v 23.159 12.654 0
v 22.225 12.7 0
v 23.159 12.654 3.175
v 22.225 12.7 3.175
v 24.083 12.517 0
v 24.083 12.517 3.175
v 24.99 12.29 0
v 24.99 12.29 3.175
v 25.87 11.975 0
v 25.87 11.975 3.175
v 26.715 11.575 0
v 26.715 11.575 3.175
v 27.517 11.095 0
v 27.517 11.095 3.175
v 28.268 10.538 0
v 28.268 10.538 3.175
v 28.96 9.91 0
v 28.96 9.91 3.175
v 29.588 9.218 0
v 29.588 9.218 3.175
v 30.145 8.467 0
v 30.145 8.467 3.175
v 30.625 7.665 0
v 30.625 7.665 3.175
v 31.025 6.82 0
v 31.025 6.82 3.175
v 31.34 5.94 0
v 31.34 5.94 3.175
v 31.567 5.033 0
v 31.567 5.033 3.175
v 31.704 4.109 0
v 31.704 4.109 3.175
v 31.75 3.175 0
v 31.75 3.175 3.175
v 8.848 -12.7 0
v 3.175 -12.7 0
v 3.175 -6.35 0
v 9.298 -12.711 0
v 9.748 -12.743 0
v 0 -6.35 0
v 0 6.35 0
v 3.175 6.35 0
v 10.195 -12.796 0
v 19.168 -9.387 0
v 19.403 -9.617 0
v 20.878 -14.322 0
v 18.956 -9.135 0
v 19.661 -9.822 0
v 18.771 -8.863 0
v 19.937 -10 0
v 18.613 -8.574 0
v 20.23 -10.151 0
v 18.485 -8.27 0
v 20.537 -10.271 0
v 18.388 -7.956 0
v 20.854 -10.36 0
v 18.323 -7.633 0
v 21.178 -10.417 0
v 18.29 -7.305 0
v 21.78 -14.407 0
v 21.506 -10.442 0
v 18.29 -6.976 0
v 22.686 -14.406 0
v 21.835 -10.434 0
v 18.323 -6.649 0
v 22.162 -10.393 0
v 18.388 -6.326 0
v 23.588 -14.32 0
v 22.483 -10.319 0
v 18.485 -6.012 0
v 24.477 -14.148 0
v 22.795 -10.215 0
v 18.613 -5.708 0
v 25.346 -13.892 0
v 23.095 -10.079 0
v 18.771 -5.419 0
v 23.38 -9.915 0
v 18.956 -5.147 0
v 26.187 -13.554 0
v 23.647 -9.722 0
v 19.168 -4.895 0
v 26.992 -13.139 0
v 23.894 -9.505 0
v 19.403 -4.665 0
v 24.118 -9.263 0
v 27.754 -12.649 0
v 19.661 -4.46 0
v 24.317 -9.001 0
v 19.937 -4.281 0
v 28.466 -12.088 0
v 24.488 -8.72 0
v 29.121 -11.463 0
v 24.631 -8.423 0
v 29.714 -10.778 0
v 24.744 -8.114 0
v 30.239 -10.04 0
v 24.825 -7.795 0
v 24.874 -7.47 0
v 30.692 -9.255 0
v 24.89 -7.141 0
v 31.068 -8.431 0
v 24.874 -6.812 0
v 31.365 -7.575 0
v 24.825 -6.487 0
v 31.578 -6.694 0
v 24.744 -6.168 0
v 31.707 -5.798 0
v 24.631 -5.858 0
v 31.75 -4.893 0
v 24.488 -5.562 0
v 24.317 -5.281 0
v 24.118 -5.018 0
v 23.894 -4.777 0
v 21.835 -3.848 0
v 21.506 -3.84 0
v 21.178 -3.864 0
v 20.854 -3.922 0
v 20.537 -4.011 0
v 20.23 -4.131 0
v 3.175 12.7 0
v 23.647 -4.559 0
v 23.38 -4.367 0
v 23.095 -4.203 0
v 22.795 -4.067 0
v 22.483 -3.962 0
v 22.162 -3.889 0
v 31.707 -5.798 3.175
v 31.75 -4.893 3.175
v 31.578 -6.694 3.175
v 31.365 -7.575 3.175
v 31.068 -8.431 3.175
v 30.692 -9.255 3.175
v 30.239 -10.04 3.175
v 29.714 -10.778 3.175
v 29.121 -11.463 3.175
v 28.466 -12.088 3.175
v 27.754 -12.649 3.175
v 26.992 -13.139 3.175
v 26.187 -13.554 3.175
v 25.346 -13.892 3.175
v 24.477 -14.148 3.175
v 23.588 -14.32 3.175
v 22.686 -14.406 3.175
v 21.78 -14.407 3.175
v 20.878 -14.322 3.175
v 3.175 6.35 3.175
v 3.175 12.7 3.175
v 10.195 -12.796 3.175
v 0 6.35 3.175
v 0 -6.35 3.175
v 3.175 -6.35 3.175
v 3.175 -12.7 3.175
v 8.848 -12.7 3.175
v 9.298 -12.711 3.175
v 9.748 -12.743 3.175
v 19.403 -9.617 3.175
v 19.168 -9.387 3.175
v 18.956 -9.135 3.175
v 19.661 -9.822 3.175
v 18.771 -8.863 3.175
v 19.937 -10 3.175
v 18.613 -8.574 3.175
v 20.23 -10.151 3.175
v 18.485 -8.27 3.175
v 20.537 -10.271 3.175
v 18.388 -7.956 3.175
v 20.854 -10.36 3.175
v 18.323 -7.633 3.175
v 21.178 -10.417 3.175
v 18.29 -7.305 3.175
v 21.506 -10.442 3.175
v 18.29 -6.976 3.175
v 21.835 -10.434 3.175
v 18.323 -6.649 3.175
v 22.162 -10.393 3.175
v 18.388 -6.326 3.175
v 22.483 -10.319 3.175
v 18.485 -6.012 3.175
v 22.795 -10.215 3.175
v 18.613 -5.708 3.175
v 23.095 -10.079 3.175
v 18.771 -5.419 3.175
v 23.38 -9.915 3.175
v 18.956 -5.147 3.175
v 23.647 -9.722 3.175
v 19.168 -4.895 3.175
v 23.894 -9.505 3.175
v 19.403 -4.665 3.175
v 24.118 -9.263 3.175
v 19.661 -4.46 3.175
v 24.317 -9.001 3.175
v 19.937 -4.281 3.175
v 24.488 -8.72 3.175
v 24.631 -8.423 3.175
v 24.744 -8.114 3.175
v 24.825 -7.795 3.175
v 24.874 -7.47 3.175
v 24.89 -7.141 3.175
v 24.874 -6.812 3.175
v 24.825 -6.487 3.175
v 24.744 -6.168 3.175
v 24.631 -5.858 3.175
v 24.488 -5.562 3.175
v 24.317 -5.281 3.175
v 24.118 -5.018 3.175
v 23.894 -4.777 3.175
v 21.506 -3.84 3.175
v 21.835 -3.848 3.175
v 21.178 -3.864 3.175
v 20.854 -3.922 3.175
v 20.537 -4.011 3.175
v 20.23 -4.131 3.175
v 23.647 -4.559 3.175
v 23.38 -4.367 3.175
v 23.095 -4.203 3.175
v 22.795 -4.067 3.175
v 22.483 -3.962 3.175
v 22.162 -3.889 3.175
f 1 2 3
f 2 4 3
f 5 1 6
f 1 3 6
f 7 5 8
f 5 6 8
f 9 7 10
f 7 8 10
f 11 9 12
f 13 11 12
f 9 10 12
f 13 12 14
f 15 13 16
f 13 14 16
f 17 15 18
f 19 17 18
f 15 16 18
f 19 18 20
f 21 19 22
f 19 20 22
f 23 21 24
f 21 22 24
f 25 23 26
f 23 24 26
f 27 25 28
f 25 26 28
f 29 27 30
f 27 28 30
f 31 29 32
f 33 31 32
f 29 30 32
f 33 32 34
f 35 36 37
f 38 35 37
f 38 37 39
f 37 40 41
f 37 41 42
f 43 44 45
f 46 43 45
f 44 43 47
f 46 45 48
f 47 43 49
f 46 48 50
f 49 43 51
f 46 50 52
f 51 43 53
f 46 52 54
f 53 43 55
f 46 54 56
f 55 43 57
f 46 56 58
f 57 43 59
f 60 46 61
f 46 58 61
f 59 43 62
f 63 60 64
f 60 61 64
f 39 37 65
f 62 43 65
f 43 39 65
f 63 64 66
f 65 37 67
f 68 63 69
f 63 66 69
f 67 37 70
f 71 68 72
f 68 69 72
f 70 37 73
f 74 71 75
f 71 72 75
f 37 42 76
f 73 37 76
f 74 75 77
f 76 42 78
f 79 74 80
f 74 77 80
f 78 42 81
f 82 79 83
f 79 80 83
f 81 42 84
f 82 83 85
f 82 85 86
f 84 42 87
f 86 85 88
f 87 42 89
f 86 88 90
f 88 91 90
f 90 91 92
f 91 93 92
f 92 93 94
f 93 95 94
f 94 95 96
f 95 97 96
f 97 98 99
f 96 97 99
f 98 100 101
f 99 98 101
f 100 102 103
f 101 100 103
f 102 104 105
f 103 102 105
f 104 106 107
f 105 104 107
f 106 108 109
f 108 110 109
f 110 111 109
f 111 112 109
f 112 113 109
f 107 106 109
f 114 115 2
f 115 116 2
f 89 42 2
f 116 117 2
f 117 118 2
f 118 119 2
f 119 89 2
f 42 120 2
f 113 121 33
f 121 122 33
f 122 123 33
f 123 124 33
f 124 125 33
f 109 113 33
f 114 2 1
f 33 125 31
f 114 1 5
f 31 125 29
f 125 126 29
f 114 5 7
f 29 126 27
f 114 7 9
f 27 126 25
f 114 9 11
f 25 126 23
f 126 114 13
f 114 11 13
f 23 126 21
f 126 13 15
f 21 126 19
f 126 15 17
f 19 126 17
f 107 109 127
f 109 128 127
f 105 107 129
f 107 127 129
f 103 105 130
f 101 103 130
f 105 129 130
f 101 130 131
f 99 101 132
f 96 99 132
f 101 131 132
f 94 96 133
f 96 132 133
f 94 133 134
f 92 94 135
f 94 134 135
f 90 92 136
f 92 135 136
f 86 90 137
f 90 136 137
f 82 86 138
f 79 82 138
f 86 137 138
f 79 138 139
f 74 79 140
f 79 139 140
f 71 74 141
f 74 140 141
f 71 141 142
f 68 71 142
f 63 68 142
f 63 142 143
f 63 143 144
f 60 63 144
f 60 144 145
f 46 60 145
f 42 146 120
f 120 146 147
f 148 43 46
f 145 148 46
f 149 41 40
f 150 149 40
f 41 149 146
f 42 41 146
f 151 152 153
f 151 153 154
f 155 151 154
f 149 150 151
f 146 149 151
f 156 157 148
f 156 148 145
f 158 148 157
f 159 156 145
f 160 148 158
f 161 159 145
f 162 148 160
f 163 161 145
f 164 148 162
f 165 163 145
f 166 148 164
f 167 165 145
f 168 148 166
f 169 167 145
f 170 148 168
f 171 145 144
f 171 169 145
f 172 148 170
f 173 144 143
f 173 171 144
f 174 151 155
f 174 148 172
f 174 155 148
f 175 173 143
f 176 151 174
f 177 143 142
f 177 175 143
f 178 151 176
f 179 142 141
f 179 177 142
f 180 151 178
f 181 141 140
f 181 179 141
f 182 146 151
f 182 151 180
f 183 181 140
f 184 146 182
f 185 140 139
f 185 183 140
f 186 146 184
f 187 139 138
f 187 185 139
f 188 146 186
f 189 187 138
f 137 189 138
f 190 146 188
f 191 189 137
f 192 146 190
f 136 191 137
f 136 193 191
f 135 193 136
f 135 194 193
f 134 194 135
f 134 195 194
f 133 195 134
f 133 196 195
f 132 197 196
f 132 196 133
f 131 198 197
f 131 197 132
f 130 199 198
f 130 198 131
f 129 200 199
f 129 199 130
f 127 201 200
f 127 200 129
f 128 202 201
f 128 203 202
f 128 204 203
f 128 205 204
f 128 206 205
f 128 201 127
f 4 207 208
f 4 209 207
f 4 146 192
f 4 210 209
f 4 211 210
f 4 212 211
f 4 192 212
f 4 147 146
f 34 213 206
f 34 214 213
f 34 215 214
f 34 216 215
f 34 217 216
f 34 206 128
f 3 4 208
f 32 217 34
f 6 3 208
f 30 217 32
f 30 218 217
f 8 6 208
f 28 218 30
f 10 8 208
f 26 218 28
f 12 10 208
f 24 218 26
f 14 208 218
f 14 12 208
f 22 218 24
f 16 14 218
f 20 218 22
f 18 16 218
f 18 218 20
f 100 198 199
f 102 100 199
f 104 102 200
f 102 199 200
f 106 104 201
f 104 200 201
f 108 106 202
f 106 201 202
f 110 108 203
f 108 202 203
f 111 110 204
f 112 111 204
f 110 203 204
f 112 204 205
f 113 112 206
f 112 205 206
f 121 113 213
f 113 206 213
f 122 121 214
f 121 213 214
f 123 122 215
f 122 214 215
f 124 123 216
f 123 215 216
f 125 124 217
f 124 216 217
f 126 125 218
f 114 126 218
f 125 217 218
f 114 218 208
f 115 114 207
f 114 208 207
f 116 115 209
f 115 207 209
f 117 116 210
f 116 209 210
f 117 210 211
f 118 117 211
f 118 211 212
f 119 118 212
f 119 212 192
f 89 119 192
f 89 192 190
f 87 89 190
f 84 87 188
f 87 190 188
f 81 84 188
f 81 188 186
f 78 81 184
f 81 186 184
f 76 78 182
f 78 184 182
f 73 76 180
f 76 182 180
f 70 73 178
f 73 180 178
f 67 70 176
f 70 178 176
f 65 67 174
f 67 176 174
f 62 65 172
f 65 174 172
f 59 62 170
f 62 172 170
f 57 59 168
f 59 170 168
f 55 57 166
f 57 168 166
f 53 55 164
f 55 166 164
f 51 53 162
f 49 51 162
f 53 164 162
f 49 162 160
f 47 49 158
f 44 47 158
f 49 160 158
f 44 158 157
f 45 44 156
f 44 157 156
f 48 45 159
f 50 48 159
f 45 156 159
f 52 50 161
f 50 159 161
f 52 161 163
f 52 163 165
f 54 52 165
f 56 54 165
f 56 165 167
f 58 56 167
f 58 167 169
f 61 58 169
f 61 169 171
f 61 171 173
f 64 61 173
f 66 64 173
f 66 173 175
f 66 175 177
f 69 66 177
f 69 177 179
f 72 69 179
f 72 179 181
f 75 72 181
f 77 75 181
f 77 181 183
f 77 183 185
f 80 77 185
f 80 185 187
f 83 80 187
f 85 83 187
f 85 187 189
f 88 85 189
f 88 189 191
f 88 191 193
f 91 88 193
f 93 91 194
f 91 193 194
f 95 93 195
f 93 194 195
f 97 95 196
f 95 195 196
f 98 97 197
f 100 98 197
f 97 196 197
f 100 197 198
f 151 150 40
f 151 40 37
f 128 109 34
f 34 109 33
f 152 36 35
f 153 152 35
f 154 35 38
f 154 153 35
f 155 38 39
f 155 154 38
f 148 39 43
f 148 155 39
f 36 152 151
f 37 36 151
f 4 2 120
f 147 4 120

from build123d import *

# Parameters (mm, degrees)
BOSS_EXTRUDE1_DEPTH = 3.175
SKETCH2_R           = 3.302
CUT_EXTRUDE1_DEPTH  = 3.175
FILLET1_R           = 9.525
SKETCH3_W           = 3.175
SKETCH3_H           = 6.35
CUT_EXTRUDE2_DEPTH  = 3.175


with BuildPart() as part:
    # Sketch1 → Boss-Extrude1 (new body)
    with BuildSketch(Plane.XY):
        Polygon((0, 12.7), (0, -12.7), (9.525, -12.7), (31.75, -15.875), (31.75, 12.7), align=None)
    extrude(amount=BOSS_EXTRUDE1_DEPTH)

    # Sketch2 → Cut-Extrude1 (cut)
    with BuildSketch(Plane.XY.offset(3.175)):
        with Locations((21.588299978, -7.140871599)):
            Circle(SKETCH2_R)
    extrude(amount=-CUT_EXTRUDE1_DEPTH, mode=Mode.SUBTRACT)

    # Fillet1
    fillet1_edges = [part.edges().sort_by_distance(p)[0] for p in [
        (31.75, 12.7, 1.5875),
        (31.75, -15.875, 1.5875),
        (9.525, -12.7, 1.5875),
    ]]
    fillet(fillet1_edges, radius=FILLET1_R)

    # Sketch3 → Cut-Extrude2 (cut)
    with BuildSketch(Plane.XY.offset(3.175)):
        with Locations((1.5875, -9.525)):
            Rectangle(SKETCH3_W, SKETCH3_H)
        with Locations((1.5875, 9.525)):
            Rectangle(SKETCH3_W, SKETCH3_H)
    extrude(amount=-CUT_EXTRUDE2_DEPTH, mode=Mode.SUBTRACT)


solid = part.part
